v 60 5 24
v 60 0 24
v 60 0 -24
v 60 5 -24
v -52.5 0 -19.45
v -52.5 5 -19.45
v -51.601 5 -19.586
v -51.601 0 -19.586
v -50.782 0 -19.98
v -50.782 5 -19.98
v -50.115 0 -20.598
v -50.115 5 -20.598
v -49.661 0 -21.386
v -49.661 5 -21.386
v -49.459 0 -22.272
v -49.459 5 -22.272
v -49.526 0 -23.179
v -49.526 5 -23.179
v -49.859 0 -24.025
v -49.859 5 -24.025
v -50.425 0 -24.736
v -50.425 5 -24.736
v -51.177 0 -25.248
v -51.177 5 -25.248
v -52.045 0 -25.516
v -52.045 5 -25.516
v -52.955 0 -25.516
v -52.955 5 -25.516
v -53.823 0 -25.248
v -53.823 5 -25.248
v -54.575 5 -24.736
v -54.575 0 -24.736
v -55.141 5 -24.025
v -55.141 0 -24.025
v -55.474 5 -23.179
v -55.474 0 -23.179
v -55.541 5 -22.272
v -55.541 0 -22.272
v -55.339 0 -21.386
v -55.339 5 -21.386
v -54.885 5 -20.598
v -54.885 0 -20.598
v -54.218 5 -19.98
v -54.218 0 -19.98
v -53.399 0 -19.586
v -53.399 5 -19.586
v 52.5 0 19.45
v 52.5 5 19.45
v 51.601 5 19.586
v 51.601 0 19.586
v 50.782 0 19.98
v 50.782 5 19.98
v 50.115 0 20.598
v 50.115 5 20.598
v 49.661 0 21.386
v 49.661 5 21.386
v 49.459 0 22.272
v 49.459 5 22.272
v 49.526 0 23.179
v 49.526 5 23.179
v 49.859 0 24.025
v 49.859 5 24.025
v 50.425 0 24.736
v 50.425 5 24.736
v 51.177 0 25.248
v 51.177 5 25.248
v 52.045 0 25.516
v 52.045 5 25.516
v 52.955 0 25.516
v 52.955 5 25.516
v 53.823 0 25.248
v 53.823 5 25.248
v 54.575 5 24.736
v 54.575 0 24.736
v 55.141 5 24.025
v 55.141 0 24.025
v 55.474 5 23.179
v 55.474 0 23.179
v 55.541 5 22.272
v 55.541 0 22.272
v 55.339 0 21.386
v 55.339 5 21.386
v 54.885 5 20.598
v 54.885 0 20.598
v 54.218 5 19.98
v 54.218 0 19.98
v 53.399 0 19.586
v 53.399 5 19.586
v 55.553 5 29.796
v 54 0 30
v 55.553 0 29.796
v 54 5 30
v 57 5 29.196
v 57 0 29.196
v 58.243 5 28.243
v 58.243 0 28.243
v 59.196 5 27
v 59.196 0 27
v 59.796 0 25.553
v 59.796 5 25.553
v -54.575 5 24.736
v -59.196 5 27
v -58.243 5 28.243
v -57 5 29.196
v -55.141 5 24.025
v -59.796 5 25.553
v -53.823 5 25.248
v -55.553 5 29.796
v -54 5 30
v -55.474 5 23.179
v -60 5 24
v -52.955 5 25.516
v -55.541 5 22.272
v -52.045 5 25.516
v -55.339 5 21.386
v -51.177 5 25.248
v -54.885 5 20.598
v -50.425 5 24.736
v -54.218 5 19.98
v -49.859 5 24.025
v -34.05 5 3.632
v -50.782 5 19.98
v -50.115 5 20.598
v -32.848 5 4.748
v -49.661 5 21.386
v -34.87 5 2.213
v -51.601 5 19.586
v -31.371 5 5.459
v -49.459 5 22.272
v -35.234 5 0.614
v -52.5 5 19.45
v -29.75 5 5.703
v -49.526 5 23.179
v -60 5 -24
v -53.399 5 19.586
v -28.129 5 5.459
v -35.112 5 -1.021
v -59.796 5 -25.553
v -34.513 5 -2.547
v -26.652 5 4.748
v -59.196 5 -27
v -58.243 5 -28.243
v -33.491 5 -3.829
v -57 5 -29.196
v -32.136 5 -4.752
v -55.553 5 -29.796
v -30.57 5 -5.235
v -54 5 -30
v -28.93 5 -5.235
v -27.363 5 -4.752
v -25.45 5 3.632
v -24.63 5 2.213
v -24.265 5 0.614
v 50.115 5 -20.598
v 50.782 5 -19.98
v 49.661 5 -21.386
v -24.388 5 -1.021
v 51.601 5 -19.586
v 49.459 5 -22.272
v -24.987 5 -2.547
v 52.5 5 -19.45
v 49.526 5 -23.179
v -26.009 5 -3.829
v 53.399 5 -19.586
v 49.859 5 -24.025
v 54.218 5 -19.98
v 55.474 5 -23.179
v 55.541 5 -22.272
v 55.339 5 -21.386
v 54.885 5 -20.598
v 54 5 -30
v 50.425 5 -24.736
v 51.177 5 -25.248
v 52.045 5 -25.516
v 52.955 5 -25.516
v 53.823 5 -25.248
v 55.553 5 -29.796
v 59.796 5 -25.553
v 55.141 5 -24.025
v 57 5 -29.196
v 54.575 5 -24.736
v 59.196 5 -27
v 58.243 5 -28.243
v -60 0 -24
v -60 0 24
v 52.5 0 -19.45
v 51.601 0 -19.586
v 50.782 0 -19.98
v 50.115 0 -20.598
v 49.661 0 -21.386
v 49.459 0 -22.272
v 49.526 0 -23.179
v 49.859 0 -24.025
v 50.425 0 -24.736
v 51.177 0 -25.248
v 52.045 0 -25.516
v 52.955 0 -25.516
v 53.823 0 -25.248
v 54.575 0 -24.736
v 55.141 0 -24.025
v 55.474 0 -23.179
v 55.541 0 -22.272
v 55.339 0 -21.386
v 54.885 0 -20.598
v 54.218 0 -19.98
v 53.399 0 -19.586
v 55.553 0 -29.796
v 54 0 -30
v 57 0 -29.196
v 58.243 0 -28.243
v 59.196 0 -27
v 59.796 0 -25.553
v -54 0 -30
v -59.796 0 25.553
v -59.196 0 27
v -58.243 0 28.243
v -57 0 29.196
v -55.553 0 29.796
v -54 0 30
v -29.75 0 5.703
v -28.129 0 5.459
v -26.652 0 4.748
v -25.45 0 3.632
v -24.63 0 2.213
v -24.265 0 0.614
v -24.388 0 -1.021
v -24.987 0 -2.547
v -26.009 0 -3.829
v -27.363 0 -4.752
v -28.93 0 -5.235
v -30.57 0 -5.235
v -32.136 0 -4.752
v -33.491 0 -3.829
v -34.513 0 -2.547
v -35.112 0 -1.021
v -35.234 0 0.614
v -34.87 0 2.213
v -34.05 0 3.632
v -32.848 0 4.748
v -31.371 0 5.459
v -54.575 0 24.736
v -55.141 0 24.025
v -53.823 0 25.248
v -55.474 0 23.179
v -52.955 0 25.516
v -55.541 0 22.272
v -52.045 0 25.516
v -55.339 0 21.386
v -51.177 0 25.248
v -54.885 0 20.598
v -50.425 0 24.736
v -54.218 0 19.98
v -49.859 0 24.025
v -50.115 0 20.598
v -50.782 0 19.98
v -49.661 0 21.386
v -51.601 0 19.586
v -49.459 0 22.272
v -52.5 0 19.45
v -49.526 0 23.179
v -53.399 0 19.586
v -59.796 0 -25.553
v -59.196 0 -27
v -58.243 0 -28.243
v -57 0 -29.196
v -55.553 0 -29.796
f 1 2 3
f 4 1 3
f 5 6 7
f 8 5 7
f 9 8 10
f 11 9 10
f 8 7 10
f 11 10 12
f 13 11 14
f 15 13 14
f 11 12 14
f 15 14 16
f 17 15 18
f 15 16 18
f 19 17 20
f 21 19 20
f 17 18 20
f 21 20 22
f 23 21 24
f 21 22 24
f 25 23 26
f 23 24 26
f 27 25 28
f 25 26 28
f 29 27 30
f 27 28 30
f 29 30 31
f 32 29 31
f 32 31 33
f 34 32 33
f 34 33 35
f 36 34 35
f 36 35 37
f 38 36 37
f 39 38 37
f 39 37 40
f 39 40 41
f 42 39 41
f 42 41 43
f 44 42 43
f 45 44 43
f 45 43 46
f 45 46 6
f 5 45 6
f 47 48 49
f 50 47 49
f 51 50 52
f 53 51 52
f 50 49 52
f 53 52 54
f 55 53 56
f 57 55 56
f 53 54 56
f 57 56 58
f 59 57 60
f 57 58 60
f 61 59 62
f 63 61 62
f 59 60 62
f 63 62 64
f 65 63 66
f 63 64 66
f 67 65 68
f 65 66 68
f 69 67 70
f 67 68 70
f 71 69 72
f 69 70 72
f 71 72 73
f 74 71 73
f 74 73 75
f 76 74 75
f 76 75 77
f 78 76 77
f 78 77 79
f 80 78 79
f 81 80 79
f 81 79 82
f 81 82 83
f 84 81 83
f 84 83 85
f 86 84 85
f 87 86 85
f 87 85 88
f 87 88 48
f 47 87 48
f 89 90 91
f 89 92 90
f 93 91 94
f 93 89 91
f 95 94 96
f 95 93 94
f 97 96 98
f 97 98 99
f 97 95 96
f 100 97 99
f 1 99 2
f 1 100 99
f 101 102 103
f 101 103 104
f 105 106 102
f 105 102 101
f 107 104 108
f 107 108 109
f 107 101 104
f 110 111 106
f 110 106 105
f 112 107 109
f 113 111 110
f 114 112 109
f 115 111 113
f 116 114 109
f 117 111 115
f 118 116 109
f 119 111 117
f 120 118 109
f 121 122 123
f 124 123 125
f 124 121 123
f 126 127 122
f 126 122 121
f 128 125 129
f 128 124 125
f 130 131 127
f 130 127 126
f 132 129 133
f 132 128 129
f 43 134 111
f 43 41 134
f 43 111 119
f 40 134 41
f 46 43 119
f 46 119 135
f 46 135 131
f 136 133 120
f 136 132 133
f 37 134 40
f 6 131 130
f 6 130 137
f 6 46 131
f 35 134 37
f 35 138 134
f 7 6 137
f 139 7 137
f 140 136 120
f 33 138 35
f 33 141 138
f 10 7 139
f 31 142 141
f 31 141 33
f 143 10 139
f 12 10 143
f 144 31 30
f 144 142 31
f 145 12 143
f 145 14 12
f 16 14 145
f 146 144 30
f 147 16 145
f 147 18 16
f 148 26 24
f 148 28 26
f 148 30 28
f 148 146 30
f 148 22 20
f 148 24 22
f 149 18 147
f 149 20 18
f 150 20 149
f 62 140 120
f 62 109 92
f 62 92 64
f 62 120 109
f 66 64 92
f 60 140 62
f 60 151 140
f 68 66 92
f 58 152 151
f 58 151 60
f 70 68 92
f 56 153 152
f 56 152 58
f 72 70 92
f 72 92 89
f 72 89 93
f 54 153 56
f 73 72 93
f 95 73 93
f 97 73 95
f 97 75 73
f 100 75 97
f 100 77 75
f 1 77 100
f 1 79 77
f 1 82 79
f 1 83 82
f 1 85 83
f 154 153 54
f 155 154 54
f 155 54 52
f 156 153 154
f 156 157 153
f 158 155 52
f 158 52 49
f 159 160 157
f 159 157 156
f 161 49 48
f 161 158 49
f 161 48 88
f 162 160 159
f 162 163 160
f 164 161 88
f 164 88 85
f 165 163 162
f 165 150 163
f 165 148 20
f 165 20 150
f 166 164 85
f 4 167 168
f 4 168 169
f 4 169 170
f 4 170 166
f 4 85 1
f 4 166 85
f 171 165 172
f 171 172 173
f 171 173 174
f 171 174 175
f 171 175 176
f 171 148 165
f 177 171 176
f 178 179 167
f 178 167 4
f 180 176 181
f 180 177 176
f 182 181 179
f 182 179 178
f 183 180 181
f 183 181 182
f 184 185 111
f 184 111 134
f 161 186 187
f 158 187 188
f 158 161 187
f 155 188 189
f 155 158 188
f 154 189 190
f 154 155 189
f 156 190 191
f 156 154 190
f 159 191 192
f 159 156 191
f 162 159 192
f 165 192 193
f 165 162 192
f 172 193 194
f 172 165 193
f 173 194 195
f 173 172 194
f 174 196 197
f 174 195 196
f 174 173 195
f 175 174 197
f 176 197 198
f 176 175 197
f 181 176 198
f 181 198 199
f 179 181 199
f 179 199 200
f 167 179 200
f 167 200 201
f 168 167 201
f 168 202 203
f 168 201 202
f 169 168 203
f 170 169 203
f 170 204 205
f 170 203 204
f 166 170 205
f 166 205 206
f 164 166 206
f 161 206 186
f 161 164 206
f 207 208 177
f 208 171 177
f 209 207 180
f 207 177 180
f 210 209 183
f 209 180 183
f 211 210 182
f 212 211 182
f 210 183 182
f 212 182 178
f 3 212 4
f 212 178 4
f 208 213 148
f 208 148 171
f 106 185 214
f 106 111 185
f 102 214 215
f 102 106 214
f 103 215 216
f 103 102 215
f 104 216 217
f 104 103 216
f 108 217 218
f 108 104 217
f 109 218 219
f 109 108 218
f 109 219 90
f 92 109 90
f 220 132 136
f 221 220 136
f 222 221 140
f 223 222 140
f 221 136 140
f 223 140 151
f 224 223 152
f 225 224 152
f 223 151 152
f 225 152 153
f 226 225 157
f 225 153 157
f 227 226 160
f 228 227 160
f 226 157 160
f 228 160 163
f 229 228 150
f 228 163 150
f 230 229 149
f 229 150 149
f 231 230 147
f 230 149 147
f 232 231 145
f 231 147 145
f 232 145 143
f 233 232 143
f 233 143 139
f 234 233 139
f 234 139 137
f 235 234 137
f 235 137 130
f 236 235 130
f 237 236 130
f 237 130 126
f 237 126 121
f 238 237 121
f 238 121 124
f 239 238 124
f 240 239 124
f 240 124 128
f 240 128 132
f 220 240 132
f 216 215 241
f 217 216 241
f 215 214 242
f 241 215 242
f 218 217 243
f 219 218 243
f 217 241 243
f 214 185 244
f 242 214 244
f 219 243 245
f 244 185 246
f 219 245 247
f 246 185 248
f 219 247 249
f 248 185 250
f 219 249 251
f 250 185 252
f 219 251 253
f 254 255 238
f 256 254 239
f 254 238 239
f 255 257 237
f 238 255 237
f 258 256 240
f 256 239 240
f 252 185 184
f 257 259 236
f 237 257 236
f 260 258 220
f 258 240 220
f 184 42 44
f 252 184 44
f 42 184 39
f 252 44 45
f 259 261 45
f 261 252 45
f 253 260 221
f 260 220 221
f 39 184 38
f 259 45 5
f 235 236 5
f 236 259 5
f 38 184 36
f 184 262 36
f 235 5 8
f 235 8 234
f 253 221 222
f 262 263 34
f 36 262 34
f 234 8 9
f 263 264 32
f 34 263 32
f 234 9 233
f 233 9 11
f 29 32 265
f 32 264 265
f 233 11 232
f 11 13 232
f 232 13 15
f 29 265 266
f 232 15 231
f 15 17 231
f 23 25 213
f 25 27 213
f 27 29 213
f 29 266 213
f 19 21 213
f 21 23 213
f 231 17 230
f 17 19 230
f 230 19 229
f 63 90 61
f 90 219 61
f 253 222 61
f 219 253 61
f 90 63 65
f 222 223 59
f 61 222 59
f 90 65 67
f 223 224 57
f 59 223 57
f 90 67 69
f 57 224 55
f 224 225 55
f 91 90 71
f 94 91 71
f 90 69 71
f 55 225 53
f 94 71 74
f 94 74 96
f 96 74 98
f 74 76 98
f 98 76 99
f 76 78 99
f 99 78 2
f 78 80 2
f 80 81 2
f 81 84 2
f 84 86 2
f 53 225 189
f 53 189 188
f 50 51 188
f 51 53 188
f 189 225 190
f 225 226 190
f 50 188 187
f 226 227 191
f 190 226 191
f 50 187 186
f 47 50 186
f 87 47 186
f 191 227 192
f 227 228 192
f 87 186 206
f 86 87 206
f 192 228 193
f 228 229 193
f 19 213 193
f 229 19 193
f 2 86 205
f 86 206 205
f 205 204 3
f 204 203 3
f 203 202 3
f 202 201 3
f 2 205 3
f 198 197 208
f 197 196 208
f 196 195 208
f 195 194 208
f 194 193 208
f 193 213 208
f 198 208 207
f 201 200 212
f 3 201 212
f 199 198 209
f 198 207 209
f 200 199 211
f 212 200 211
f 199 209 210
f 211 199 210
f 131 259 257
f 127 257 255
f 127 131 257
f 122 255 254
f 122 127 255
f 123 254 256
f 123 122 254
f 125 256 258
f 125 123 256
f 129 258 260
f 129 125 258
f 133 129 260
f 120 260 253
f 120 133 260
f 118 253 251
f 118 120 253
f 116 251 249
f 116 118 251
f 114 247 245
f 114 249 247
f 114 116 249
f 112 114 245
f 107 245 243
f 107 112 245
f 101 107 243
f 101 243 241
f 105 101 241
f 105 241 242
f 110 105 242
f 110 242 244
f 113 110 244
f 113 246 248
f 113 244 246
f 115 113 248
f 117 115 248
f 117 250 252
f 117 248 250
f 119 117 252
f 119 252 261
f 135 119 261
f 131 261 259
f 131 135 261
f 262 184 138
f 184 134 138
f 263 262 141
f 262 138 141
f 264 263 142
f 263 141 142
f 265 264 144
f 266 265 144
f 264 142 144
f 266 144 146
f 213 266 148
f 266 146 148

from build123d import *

# Parameters (mm, degrees)
SKETCH1_W               = 120
SKETCH1_H               = 60
BOSS_EXTRUDE1_DEPTH     = 5
SKETCH2_R               = 3.05
CUT_EXTRUDE1_DEPTH      = 68.268120235
MIRROR2_COPY_1_SKETCH_R = 3.05
MIRROR2_COPY_1_DEPTH    = 68.268120235
SKETCH3_R               = 5.5
CUT_EXTRUDE2_DEPTH      = 68.268120235
FILLET1_R               = 6


with BuildPart() as part:
    # Sketch1 → Boss-Extrude1 (new body)
    with BuildSketch(Plane(origin=(0, 0, 0), x_dir=(1, 0, 0), z_dir=(0, 1, 0))):
        Rectangle(SKETCH1_W, SKETCH1_H)
    extrude(amount=BOSS_EXTRUDE1_DEPTH)

    # Sketch2 → Cut-Extrude1 (cut, through all)
    with BuildSketch(Plane(origin=(0, 5, 0), x_dir=(1, 0, 0), z_dir=(0, 1, 0))):
        with Locations(Location((-52.5, 22.5, 0), (0, 0, 270))):
            Circle(SKETCH2_R)
    cut_extrude1 = extrude(amount=-CUT_EXTRUDE1_DEPTH, mode=Mode.SUBTRACT)

    # Mirror1: Cut-Extrude1 across plane
    add(cut_extrude1.mirror(Plane.XY), mode=Mode.SUBTRACT)

    # Mirror2: Cut-Extrude1 across plane
    add(cut_extrude1.mirror(Plane(origin=(0, 0, 0), x_dir=(0, 0, 1), z_dir=(1, 0, 0))), mode=Mode.SUBTRACT)

    # Mirror2 copy 1 sketch → Mirror2 copy 1 (cut, through all)
    with BuildSketch(Plane(origin=(0, 5, 0), x_dir=(-1, 0, 0), z_dir=(0, 1, 0))):
        with Locations(Location((-52.5, 22.5, 0), (0, 0, 270))):
            Circle(MIRROR2_COPY_1_SKETCH_R)
    extrude(amount=-MIRROR2_COPY_1_DEPTH, mode=Mode.SUBTRACT)

    # Sketch3 → Cut-Extrude2 (cut, through all)
    with BuildSketch(Plane(origin=(0, 5, 0), x_dir=(1, 0, 0), z_dir=(0, 1, 0))):
        with Locations(Location((-29.74982269, -0.203269064, 0), (0, 0, 270))):
            Circle(SKETCH3_R)
    extrude(amount=-CUT_EXTRUDE2_DEPTH, mode=Mode.SUBTRACT)

    # Fillet1
    fillet1_edges = [part.edges().sort_by_distance(p)[0] for p in [
        (60, 2.5, 30),
        (-60, 2.5, 30),
        (-60, 2.5, -30),
        (60, 2.5, -30),
    ]]
    fillet(fillet1_edges, radius=FILLET1_R)


solid = part.part
